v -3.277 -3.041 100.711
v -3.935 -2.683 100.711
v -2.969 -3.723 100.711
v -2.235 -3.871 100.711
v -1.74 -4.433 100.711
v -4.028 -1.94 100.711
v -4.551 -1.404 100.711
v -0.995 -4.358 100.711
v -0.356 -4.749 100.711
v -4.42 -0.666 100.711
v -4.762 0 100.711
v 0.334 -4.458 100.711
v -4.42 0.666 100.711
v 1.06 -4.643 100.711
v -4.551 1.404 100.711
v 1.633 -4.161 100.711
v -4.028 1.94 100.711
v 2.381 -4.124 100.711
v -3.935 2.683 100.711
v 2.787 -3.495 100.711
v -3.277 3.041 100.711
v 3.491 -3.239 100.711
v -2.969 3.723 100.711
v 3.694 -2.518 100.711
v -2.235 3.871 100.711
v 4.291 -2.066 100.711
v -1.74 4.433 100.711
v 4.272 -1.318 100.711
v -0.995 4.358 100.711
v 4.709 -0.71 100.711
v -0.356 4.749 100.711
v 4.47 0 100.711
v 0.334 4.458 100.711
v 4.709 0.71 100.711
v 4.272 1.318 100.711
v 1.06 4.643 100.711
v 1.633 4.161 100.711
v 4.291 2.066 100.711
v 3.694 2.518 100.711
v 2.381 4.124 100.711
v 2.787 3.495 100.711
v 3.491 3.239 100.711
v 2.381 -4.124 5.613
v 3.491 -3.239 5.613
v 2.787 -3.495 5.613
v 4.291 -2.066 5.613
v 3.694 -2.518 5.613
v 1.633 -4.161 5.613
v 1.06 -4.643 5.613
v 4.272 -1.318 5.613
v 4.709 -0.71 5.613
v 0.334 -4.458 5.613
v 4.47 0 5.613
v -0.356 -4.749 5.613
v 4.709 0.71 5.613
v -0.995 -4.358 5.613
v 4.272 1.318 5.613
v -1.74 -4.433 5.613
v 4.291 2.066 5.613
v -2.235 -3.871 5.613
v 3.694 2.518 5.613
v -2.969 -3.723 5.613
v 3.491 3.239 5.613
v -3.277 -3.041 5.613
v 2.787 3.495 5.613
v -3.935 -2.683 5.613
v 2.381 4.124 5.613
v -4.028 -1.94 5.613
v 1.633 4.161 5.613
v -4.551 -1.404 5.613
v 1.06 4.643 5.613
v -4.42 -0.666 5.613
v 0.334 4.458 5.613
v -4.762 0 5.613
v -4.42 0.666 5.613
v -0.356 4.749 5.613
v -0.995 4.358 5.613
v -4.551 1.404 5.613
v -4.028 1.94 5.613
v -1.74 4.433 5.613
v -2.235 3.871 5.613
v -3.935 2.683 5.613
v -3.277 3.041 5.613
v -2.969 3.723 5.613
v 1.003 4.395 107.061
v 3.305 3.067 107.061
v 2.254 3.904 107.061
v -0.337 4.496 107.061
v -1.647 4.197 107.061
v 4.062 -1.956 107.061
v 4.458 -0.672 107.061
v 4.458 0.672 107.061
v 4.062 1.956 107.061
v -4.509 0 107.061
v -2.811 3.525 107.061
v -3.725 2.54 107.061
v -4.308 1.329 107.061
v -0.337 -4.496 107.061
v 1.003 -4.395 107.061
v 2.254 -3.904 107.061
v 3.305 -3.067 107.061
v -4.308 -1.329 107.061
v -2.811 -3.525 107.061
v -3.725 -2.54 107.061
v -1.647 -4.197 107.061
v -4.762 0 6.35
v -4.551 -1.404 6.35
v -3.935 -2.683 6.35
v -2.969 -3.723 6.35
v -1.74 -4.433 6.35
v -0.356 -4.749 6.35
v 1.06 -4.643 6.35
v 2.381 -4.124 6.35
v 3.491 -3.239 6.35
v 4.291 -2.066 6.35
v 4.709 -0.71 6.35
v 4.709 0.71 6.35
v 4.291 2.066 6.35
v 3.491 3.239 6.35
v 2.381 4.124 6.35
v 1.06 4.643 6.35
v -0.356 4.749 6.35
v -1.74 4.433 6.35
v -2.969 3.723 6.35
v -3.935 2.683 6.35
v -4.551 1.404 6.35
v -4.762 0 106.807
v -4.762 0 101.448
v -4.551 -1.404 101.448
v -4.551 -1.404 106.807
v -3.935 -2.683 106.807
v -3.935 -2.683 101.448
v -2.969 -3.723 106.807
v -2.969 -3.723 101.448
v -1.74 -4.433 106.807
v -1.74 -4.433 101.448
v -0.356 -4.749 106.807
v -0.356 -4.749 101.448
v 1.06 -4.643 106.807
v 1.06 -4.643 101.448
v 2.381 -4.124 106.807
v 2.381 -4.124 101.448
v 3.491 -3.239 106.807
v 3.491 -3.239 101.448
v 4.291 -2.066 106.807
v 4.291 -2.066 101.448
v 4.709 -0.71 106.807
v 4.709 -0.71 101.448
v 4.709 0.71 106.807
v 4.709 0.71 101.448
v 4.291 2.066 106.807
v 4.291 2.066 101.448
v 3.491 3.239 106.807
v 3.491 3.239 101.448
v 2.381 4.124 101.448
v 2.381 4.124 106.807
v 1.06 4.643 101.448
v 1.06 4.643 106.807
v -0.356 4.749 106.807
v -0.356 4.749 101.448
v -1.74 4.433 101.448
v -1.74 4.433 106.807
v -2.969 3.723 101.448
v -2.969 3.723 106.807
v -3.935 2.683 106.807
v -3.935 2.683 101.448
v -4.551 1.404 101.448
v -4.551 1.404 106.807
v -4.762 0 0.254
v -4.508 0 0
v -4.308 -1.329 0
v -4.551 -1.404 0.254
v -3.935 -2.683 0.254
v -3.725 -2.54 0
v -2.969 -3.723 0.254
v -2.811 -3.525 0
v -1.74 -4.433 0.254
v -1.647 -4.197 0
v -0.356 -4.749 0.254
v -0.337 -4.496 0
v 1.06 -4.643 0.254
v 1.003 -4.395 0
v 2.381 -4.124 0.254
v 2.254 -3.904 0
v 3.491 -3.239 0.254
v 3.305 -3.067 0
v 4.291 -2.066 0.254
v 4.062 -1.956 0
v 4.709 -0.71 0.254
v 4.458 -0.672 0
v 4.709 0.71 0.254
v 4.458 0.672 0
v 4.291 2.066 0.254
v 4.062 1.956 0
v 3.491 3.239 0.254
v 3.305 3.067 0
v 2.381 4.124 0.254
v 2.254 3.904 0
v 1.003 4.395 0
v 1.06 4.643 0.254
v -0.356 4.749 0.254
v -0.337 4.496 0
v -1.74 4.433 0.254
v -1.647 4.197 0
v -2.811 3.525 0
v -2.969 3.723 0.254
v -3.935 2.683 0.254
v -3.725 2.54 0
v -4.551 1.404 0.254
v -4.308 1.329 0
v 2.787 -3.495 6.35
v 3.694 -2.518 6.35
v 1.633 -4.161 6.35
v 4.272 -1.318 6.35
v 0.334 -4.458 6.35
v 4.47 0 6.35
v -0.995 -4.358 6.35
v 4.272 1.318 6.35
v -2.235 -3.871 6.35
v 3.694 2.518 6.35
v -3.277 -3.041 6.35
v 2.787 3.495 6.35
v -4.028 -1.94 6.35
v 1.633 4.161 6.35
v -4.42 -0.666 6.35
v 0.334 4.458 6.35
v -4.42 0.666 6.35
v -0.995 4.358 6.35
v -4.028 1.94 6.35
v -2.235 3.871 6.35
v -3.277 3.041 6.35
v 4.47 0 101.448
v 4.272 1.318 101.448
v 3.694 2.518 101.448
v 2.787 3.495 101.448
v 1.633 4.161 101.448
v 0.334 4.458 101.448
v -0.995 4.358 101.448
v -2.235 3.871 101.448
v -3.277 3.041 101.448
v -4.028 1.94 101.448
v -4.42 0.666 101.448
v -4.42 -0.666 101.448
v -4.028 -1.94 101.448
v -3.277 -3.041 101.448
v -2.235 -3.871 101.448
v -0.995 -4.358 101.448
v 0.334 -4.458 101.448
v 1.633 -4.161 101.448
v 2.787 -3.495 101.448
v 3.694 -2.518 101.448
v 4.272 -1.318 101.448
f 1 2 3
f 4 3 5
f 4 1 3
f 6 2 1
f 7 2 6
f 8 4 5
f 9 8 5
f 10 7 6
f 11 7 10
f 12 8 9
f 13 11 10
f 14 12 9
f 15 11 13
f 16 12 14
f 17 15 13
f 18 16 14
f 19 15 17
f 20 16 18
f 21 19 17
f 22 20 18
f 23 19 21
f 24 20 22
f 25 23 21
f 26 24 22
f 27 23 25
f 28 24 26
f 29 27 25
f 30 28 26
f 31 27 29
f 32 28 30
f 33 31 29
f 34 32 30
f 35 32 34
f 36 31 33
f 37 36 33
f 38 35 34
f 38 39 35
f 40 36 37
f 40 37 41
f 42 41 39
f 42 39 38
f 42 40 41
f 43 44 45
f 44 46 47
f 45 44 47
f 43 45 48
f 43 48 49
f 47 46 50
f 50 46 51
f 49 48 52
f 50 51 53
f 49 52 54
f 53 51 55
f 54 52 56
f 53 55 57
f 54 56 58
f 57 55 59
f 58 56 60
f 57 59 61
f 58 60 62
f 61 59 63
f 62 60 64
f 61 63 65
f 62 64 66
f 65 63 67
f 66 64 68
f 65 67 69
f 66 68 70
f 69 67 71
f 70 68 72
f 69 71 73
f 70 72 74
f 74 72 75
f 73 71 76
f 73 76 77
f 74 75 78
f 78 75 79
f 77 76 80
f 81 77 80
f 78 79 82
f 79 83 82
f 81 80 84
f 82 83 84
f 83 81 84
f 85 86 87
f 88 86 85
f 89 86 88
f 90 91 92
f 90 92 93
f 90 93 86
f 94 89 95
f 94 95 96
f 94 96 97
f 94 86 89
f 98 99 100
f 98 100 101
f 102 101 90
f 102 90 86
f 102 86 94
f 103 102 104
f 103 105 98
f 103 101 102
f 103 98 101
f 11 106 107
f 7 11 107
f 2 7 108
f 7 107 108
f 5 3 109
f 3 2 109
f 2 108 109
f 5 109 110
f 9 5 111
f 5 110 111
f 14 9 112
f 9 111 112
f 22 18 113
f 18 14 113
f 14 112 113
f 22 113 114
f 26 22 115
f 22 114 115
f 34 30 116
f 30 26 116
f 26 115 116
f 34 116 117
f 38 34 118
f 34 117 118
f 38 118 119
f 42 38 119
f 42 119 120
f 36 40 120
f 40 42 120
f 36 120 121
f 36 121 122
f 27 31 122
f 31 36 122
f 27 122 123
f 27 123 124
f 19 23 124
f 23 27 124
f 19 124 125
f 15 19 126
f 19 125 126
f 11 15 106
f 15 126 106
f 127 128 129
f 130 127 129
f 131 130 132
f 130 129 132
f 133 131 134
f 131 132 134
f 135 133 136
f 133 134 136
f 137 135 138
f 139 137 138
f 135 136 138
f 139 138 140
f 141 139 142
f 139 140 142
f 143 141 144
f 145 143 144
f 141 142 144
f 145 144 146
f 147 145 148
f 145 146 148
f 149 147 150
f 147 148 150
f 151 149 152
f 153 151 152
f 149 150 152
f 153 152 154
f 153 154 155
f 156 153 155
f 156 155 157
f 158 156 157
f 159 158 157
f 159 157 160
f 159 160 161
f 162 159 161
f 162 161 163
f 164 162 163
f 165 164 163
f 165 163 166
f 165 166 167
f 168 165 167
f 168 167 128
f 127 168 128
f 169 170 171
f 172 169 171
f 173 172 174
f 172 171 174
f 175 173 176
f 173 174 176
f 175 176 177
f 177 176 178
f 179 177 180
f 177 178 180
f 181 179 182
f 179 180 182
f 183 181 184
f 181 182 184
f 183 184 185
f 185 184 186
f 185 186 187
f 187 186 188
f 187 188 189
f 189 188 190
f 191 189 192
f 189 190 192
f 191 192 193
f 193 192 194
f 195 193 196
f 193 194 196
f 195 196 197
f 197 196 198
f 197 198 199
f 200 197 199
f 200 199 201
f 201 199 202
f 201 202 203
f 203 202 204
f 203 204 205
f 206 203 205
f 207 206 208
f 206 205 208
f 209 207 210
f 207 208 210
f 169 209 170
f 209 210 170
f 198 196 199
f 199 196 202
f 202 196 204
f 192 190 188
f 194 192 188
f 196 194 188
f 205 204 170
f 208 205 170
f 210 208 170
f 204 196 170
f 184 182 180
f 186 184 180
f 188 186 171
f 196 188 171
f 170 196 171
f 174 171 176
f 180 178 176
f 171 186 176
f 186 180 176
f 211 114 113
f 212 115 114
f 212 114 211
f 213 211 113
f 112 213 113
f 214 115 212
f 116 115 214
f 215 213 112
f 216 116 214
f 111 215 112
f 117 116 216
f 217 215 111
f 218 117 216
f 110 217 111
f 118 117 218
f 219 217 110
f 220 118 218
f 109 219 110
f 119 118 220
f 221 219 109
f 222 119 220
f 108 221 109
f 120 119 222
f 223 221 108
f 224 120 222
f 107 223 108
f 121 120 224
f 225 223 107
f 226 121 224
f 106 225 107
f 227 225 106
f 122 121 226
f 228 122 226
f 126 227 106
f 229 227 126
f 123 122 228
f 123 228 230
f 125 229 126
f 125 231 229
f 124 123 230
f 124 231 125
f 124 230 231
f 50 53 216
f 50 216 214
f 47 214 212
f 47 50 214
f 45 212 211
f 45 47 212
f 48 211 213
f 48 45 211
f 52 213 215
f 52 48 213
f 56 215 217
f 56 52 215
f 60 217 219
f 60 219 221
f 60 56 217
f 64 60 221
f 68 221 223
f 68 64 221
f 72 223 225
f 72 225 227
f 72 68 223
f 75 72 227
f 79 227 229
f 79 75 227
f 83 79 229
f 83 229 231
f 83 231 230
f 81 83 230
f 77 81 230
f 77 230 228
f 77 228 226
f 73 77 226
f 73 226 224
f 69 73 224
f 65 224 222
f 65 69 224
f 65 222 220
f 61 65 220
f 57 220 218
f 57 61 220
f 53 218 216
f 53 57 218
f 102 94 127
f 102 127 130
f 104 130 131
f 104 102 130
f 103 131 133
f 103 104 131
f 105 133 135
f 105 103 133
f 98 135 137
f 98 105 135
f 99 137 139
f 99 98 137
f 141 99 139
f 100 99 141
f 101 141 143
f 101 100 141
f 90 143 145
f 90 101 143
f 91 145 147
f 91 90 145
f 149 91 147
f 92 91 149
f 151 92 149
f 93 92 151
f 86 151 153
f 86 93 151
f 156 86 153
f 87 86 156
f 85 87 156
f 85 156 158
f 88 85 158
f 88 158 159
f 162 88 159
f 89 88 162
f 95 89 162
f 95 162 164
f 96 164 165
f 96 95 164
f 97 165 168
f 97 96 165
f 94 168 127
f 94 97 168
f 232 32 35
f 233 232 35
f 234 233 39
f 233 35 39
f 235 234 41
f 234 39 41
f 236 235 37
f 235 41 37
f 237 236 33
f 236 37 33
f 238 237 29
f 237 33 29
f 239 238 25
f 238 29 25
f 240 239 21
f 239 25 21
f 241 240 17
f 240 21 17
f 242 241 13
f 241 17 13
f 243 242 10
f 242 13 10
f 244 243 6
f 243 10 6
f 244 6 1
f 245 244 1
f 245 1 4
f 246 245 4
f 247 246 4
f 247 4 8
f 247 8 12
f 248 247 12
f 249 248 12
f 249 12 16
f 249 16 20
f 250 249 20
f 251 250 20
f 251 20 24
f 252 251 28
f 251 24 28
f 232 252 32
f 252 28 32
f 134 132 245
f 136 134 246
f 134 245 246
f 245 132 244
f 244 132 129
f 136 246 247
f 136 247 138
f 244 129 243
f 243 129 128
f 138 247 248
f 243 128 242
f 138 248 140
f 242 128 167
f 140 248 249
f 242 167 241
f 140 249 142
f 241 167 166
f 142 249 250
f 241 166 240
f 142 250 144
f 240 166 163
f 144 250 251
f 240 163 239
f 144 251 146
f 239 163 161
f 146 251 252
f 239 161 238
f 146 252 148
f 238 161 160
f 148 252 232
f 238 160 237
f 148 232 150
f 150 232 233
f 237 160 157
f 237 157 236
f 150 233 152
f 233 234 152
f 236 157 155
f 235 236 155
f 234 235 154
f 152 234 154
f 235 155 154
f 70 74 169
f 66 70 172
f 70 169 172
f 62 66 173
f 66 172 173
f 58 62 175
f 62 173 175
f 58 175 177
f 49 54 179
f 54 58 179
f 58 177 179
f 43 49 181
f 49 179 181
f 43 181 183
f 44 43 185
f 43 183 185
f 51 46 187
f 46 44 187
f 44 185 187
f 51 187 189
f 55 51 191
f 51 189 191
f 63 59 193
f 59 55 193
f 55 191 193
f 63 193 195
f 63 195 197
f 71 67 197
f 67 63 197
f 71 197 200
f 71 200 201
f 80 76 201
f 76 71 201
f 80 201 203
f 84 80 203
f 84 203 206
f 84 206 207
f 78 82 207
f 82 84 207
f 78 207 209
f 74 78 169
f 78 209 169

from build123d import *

# Parameters (mm, degrees)
SKETCH1_R           = 4.7625
BOSS_EXTRUDE1_DEPTH = 107.061
SKETCH2_R           = 5.514901598
SKETCH2_R_2         = 4.4704
CUT_EXTRUDE1_DEPTH  = 0.7366
CUT_EXTRUDE2_START  = 0.7366
SKETCH3_R           = 6.35
SKETCH3_R_2         = 4.4704
CUT_EXTRUDE2_DEPTH  = 0.7366
CHAMFER1_SIZE       = 0.254


with BuildPart() as part:
    # Sketch1 → Boss-Extrude1 (new body)
    with BuildSketch(Plane.XY):
        with Locations(Location((0, 0, 0), (0, 0, 180))):
            Circle(SKETCH1_R)
    extrude(amount=BOSS_EXTRUDE1_DEPTH)

    # Sketch2 → Cut-Extrude1 (cut)
    with BuildSketch(Plane.XY.offset(100.711)):
        Circle(SKETCH2_R)
        Circle(SKETCH2_R_2, mode=Mode.SUBTRACT)
    extrude(amount=CUT_EXTRUDE1_DEPTH, mode=Mode.SUBTRACT)

    # Sketch3 → Cut-Extrude2 (cut)
    with BuildSketch(Plane(origin=(0, 0, 6.35), x_dir=(-1, 0, 0), z_dir=(0, 0, -1)).offset(CUT_EXTRUDE2_START)):
        Circle(SKETCH3_R)
        with Locations(Location((0, 0, 0), (0, 0, 180))):
            Circle(SKETCH3_R_2, mode=Mode.SUBTRACT)
    extrude(amount=-CUT_EXTRUDE2_DEPTH, mode=Mode.SUBTRACT)

    # Chamfer1
    chamfer1_edges = [part.edges().sort_by_distance(p)[0] for p in [
        (4.7625, 0, 0),
        (4.7625, 0, 107.061),
    ]]
    chamfer(chamfer1_edges, length=CHAMFER1_SIZE)


solid = part.part
